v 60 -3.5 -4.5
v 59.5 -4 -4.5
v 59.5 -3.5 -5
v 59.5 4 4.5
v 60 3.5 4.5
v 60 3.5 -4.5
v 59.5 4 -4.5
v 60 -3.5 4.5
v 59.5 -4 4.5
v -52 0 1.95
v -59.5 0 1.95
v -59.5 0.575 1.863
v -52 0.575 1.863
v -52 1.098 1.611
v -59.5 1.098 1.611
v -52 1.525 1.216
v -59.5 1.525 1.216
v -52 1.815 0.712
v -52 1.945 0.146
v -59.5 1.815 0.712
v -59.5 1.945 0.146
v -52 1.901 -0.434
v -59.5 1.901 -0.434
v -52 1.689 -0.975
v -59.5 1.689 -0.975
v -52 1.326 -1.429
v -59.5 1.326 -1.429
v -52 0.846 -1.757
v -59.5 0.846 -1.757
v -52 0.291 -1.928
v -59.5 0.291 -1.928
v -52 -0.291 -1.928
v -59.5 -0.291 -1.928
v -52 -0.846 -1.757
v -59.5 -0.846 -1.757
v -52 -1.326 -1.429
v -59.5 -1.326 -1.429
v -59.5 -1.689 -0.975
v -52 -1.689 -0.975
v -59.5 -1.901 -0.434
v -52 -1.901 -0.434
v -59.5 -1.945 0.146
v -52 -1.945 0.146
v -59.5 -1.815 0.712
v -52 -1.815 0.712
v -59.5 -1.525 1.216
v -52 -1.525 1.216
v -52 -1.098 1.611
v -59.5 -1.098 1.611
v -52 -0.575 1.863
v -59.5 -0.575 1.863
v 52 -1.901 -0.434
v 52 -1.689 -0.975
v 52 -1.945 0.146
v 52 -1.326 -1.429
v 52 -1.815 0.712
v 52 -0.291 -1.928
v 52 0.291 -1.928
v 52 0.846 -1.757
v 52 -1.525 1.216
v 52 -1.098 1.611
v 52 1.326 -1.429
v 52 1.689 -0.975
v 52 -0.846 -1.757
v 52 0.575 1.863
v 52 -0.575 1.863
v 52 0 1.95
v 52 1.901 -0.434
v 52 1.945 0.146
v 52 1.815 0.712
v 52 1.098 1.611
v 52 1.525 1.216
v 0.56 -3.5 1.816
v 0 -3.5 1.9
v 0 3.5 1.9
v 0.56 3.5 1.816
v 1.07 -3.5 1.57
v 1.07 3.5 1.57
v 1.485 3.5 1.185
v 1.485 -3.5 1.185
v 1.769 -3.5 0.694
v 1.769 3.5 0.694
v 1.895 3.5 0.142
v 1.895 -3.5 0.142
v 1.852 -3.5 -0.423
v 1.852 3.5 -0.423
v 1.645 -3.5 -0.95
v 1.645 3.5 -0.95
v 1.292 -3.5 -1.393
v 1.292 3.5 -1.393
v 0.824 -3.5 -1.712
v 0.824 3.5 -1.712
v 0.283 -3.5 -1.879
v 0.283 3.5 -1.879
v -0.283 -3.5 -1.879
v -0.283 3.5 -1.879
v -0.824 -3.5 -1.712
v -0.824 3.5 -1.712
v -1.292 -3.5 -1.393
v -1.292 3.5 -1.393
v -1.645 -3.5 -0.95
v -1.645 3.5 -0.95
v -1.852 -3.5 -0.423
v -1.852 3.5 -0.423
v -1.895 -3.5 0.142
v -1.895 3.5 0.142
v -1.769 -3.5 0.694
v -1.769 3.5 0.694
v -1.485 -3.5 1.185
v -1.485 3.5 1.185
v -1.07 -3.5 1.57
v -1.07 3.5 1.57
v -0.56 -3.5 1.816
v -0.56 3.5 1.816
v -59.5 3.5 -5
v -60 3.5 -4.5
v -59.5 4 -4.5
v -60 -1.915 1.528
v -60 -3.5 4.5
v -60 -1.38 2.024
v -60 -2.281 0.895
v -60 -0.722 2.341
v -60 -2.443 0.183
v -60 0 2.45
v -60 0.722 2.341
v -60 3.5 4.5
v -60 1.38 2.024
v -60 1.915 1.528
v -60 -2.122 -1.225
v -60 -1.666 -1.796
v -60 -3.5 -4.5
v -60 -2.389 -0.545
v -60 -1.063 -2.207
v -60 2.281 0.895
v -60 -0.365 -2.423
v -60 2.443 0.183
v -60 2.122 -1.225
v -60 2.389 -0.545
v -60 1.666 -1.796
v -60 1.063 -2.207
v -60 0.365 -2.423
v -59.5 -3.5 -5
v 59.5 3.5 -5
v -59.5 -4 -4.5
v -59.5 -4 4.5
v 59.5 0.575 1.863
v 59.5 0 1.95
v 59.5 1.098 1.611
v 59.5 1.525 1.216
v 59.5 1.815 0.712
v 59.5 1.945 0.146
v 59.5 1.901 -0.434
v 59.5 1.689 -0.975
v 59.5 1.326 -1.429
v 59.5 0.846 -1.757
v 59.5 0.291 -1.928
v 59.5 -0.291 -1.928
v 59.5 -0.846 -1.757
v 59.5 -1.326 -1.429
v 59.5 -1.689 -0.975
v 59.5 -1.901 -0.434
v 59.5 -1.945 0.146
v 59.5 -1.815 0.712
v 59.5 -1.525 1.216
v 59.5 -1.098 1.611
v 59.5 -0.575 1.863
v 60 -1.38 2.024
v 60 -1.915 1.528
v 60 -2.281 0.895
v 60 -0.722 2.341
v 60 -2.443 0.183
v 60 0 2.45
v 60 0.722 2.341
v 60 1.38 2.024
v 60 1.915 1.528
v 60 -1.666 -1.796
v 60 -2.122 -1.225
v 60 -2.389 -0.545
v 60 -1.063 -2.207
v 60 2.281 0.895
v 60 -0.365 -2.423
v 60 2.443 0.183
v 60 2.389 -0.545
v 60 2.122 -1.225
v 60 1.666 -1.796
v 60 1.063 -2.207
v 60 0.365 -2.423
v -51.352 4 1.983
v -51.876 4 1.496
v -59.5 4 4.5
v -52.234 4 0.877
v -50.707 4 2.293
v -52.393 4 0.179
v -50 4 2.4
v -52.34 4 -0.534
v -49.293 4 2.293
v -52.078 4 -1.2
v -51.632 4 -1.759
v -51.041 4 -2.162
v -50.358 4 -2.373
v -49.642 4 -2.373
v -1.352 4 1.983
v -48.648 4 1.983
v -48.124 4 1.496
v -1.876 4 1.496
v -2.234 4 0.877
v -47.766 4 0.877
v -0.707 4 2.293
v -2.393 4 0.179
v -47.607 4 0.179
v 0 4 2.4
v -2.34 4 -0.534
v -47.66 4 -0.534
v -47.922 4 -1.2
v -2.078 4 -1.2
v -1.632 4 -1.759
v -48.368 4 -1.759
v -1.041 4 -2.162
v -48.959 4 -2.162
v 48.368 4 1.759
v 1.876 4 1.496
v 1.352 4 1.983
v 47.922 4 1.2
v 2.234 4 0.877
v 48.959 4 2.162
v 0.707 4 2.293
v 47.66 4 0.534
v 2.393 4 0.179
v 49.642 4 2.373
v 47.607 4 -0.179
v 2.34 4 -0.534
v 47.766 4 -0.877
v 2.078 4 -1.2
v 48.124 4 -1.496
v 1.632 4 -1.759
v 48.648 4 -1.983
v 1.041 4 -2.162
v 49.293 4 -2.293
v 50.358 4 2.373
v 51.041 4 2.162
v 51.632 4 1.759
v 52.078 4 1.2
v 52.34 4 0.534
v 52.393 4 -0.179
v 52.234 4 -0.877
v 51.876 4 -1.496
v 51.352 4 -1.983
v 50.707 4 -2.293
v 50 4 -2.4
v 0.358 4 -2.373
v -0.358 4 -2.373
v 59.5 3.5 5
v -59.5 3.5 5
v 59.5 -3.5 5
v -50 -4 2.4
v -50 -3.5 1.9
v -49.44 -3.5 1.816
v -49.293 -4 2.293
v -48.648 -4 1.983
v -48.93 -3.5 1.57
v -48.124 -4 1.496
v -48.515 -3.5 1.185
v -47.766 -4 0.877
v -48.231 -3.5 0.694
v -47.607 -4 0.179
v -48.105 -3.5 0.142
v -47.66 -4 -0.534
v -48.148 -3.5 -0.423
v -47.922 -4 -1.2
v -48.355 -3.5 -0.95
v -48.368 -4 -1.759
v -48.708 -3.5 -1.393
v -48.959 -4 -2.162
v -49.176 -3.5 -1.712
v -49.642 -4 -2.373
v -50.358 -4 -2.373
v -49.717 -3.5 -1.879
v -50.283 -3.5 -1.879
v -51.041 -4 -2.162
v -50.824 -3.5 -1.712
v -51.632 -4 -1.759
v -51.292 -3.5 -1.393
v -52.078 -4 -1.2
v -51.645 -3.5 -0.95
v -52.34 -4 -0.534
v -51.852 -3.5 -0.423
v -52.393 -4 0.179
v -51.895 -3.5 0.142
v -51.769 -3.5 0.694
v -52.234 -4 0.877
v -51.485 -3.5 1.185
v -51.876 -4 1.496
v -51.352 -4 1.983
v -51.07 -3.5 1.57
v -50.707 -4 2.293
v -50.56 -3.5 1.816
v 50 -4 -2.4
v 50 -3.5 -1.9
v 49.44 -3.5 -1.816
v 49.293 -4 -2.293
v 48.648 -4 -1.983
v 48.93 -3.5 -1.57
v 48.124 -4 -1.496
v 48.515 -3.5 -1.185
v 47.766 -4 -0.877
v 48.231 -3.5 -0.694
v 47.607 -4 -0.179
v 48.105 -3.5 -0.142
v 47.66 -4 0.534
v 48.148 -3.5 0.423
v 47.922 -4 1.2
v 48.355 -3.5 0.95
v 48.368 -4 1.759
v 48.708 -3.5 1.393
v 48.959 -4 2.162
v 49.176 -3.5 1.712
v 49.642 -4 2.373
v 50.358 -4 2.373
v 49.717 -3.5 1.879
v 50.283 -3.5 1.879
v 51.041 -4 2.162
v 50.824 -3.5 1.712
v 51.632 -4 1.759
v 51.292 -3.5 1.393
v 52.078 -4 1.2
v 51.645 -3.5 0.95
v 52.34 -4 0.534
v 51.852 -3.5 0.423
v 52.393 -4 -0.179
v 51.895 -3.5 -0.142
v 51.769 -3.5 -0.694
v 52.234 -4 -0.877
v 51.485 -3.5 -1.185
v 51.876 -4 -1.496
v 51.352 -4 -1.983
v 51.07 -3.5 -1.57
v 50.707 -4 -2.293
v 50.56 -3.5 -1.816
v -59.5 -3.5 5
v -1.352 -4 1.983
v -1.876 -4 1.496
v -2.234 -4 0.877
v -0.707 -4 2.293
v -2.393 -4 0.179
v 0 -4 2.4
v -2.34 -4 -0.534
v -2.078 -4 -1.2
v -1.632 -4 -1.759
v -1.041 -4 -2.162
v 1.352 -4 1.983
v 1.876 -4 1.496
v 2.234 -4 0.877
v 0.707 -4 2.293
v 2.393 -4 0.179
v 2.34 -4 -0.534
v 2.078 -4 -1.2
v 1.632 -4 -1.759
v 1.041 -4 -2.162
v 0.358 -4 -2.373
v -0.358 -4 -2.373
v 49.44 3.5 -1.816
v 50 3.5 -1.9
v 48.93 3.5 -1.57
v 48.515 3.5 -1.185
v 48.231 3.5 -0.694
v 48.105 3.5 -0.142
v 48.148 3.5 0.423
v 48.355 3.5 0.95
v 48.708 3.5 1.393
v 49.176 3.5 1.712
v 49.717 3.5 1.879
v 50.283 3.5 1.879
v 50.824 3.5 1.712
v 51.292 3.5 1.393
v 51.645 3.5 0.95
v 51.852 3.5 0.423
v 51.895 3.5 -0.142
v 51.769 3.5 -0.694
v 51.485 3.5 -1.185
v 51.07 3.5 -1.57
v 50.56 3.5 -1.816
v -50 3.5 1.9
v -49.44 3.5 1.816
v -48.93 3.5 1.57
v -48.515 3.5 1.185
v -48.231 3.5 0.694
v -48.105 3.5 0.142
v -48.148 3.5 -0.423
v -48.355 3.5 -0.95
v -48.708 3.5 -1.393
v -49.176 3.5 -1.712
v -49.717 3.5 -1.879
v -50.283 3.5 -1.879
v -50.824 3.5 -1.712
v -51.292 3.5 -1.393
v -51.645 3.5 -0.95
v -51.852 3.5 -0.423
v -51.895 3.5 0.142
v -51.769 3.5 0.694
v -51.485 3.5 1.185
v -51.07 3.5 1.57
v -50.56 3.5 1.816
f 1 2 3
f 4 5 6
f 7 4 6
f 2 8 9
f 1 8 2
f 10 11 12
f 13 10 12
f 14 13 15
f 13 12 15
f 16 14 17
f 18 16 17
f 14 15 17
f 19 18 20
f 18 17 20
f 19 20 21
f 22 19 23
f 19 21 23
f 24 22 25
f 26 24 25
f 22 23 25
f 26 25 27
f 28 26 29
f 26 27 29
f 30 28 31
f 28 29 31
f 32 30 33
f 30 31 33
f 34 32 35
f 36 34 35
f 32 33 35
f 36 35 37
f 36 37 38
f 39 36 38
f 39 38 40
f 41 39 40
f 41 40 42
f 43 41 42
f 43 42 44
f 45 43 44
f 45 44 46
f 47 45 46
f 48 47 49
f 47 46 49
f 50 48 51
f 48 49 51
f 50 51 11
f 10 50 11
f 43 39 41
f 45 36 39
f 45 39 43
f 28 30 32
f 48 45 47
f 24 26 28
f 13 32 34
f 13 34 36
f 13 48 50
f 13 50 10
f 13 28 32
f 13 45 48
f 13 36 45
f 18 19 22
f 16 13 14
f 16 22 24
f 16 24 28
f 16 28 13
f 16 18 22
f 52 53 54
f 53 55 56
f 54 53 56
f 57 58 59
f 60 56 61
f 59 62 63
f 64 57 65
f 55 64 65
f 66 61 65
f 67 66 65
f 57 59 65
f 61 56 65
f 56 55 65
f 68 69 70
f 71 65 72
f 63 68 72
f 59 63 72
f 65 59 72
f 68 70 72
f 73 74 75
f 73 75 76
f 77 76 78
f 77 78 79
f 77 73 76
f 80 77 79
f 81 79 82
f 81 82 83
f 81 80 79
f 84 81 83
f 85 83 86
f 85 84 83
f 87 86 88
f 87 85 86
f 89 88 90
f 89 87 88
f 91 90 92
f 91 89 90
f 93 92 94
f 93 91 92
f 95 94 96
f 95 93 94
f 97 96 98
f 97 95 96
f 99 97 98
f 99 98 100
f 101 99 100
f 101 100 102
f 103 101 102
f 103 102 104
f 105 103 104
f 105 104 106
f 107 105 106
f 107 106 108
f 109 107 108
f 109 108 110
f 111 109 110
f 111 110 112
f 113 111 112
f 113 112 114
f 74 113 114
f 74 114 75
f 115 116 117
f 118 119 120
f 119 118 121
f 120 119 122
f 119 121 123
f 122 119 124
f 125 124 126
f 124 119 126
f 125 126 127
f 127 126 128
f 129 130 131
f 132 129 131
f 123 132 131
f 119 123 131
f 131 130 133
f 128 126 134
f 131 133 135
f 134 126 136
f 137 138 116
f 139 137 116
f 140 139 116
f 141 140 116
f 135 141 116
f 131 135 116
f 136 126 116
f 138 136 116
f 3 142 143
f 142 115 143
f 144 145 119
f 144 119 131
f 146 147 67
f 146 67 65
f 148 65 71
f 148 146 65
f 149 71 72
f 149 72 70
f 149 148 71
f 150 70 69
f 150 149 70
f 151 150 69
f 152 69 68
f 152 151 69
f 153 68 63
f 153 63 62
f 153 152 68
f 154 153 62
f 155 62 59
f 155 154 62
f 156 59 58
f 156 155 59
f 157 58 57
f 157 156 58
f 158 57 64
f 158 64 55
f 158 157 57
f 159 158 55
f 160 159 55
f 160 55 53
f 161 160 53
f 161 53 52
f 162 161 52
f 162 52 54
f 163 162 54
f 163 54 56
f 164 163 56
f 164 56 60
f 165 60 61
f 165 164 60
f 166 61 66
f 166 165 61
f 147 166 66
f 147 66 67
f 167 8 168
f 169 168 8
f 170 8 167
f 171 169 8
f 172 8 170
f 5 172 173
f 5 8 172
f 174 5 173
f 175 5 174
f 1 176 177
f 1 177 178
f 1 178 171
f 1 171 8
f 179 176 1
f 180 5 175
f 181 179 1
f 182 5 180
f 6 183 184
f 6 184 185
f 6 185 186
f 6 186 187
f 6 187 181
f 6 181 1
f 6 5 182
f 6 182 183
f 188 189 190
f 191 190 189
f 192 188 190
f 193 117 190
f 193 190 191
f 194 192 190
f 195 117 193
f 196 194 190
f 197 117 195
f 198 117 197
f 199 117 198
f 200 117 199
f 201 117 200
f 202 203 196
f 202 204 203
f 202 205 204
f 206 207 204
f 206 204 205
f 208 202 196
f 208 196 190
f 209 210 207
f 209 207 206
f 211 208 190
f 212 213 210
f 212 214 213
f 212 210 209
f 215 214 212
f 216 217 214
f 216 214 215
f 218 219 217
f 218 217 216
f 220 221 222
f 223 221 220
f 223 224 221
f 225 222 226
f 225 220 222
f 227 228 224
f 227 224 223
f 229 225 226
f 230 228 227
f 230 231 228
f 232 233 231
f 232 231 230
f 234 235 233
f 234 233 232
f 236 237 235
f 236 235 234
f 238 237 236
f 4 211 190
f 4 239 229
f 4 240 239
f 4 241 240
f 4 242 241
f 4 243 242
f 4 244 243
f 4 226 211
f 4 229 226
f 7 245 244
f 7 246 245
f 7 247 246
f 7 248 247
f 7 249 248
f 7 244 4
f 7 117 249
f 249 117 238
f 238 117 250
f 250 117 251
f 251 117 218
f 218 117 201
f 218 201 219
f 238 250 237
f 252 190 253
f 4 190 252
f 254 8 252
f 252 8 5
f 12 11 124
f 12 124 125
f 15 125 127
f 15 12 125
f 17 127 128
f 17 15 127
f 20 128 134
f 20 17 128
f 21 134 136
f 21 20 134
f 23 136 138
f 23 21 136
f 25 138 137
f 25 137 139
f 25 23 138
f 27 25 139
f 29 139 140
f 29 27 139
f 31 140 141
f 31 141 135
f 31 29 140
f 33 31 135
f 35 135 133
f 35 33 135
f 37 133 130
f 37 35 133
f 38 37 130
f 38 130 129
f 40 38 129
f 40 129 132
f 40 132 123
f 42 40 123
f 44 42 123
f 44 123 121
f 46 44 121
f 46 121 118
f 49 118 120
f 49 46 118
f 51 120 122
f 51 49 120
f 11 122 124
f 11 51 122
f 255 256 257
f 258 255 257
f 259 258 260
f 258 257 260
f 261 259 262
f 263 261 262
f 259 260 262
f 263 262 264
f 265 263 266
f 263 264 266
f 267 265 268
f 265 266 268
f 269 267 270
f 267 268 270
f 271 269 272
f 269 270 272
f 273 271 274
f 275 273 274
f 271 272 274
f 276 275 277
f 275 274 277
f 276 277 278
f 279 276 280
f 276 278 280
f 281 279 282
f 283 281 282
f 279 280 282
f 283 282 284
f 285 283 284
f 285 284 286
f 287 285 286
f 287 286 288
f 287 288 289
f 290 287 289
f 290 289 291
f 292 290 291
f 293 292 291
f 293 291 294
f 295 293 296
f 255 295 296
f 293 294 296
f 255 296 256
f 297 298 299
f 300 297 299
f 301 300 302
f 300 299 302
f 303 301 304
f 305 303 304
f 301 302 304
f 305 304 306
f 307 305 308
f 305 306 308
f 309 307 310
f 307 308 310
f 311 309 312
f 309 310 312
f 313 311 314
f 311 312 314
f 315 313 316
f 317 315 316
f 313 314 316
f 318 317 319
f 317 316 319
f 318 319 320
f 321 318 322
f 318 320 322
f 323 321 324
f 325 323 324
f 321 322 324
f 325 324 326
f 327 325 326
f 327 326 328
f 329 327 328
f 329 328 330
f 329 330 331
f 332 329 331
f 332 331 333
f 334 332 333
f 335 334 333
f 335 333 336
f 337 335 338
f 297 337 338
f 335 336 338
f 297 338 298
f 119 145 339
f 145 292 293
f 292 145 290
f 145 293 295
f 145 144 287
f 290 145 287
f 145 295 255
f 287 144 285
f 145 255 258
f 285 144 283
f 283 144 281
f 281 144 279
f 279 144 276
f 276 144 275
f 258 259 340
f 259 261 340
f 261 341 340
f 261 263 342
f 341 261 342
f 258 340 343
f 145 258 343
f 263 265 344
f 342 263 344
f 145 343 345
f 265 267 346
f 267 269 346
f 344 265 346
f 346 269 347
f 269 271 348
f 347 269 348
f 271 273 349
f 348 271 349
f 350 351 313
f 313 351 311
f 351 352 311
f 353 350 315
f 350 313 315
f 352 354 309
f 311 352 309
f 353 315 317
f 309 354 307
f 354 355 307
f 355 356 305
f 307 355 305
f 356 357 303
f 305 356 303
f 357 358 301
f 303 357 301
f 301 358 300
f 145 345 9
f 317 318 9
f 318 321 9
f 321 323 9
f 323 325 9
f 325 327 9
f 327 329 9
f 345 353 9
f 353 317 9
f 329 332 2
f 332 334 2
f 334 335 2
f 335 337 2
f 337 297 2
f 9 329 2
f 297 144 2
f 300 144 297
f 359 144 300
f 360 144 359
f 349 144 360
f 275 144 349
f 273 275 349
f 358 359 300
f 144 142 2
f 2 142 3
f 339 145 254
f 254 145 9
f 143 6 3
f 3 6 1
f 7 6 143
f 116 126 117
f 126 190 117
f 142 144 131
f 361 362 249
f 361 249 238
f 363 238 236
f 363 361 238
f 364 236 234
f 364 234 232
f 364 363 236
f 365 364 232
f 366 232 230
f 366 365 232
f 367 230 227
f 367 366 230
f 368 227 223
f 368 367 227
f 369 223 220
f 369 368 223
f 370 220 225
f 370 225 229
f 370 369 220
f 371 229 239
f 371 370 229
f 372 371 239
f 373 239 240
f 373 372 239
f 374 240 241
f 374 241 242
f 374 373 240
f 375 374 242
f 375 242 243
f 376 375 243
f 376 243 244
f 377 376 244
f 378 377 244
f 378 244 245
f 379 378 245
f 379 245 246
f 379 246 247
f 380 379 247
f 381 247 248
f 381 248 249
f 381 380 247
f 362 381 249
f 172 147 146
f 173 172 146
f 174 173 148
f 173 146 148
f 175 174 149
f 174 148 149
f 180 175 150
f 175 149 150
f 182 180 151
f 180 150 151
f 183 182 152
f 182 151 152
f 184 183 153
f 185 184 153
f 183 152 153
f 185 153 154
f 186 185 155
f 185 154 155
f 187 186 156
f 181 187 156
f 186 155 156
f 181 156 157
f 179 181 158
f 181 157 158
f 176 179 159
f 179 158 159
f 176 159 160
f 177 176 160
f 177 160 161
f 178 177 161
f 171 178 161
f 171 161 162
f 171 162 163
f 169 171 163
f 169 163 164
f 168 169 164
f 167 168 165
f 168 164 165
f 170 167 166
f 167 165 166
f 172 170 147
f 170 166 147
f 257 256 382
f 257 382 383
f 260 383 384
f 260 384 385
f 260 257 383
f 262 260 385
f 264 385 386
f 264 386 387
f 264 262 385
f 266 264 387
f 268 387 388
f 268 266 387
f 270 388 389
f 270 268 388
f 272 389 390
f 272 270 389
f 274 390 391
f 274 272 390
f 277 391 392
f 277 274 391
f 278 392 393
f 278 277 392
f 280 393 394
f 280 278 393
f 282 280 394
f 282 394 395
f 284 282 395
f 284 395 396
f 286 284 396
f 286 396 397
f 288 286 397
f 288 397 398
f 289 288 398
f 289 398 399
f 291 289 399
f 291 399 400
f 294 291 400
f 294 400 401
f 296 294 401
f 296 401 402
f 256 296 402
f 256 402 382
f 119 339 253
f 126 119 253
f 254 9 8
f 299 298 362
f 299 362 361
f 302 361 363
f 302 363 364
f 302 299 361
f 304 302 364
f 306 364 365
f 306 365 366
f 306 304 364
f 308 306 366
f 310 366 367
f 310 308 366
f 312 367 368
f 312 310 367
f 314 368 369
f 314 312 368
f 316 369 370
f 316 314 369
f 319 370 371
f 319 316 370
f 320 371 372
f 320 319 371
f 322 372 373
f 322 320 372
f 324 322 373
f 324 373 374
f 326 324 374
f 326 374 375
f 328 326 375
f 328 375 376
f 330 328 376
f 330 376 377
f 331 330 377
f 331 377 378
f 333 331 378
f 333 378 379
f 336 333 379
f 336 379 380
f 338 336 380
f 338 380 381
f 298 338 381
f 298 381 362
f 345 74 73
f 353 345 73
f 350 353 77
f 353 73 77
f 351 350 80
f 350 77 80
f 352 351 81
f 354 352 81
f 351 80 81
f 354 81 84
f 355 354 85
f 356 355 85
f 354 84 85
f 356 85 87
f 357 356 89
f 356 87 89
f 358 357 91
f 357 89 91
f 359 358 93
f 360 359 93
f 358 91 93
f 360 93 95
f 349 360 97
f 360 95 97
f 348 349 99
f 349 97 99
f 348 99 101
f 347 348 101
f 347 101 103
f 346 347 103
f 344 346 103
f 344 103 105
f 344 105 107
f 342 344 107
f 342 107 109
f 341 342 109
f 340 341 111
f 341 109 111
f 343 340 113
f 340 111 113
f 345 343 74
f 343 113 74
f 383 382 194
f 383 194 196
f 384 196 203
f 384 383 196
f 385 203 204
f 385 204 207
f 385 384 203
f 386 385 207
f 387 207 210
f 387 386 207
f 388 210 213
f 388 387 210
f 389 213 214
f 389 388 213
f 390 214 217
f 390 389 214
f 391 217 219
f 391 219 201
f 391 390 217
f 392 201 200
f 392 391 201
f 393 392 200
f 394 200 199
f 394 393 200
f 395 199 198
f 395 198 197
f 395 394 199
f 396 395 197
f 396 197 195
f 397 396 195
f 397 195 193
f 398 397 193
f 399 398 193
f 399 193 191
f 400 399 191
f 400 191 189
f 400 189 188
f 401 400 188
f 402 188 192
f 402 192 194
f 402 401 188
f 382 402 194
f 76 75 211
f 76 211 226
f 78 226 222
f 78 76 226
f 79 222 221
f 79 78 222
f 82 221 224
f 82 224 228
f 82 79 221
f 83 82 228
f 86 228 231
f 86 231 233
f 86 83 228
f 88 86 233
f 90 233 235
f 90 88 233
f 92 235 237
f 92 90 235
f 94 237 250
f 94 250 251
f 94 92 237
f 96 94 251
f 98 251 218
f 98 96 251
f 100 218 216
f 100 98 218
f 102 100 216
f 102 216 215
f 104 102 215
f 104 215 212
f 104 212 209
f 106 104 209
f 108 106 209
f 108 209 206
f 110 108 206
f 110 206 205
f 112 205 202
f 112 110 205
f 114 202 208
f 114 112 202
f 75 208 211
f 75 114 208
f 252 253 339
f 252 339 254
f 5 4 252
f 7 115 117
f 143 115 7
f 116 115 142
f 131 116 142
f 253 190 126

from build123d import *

# Parameters (mm, degrees)
SKETCH1_W           = 120
SKETCH1_H           = 10
SKETCH1_R           = 1.9
BOSS_EXTRUDE1_DEPTH = 4
SKETCH2_R           = 1.95
CUT_EXTRUDE1_DEPTH  = 8
CHAMFER1_SIZE       = 0.5


with BuildPart() as part:
    # Sketch1 → Boss-Extrude1 (new, symmetric)
    with BuildSketch(Plane(origin=(0, 0, 0), x_dir=(1, 0, 0), z_dir=(0, 1, 0))):
        Rectangle(SKETCH1_W, SKETCH1_H)
        with Locations(Location((-50, 0, 0), (0, 0, 270))):
            Circle(SKETCH1_R, mode=Mode.SUBTRACT)
        with Locations(Location((50, 0, 0), (0, 0, 90))):
            Circle(SKETCH1_R, mode=Mode.SUBTRACT)
        with Locations(Location((0, 0, 0), (0, 0, 270))):
            Circle(SKETCH1_R, mode=Mode.SUBTRACT)
    extrude(amount=BOSS_EXTRUDE1_DEPTH, both=True)

    # Sketch2 → Cut-Extrude1 (cut)
    with BuildSketch(Plane.ZY.offset(60)):
        Circle(SKETCH2_R)
    cut_extrude1 = extrude(amount=-CUT_EXTRUDE1_DEPTH, mode=Mode.SUBTRACT)

    # Mirror1: Cut-Extrude1 across plane
    add(cut_extrude1.mirror(Plane(origin=(0, 0, 0), x_dir=(0, 0, 1), z_dir=(1, 0, 0))), mode=Mode.SUBTRACT)

    # Chamfer1
    chamfer1_edges = [part.edges().sort_by_distance(p)[0] for p in [
        (-50, -4, -1.9),
        (-50, 4, -1.9),
        (-60, 4, 0),
        (50, -4, 1.9),
        (50, 4, 1.9),
        (0, 4, 5),
        (0, -4, -1.9),
        (0, 4, -1.9),
        (-60, 0, -1.95),
        (60, 0, -1.95),
        (60, 4, 0),
        (0, -4, 5),
        (-60, -4, 0),
        (0, -4, -5),
        (60, -4, 0),
        (60, 0, 5),
        (-60, 0, 5),
        (-60, 0, -5),
        (60, 0, -5),
        (0, 4, -5),
    ]]
    chamfer(chamfer1_edges, length=CHAMFER1_SIZE)


solid = part.part
